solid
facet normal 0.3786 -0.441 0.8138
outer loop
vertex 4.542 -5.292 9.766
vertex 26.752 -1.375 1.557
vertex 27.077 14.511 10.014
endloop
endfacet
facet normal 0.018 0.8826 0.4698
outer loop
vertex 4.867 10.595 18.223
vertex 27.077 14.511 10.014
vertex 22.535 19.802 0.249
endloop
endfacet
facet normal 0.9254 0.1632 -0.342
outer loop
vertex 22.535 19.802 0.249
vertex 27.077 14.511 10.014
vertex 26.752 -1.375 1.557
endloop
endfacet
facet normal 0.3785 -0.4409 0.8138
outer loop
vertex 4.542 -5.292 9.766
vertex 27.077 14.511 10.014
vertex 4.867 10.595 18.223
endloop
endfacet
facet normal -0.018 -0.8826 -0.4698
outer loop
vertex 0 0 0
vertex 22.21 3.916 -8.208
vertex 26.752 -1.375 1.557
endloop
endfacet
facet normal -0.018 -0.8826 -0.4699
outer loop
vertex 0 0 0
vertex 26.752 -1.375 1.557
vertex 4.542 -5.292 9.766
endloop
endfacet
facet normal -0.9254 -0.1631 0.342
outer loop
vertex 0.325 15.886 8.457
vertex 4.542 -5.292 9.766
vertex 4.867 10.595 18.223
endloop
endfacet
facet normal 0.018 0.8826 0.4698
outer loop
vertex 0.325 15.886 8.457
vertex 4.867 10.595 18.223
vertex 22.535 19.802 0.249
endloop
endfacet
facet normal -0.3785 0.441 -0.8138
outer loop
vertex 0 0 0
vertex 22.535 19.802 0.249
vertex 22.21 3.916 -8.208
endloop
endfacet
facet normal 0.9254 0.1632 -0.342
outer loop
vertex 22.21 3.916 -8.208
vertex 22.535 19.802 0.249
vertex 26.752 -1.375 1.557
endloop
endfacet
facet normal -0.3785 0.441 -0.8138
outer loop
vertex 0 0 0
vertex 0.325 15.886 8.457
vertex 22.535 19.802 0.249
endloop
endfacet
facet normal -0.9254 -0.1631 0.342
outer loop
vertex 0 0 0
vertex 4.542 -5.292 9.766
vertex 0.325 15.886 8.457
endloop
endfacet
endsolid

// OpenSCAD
$fn = 50;

difference() {
	union() {
		rotate(a = [30, 20, 10]) {
			cube(size = [24, 18, 12]);
		}
	}
	union();
}
